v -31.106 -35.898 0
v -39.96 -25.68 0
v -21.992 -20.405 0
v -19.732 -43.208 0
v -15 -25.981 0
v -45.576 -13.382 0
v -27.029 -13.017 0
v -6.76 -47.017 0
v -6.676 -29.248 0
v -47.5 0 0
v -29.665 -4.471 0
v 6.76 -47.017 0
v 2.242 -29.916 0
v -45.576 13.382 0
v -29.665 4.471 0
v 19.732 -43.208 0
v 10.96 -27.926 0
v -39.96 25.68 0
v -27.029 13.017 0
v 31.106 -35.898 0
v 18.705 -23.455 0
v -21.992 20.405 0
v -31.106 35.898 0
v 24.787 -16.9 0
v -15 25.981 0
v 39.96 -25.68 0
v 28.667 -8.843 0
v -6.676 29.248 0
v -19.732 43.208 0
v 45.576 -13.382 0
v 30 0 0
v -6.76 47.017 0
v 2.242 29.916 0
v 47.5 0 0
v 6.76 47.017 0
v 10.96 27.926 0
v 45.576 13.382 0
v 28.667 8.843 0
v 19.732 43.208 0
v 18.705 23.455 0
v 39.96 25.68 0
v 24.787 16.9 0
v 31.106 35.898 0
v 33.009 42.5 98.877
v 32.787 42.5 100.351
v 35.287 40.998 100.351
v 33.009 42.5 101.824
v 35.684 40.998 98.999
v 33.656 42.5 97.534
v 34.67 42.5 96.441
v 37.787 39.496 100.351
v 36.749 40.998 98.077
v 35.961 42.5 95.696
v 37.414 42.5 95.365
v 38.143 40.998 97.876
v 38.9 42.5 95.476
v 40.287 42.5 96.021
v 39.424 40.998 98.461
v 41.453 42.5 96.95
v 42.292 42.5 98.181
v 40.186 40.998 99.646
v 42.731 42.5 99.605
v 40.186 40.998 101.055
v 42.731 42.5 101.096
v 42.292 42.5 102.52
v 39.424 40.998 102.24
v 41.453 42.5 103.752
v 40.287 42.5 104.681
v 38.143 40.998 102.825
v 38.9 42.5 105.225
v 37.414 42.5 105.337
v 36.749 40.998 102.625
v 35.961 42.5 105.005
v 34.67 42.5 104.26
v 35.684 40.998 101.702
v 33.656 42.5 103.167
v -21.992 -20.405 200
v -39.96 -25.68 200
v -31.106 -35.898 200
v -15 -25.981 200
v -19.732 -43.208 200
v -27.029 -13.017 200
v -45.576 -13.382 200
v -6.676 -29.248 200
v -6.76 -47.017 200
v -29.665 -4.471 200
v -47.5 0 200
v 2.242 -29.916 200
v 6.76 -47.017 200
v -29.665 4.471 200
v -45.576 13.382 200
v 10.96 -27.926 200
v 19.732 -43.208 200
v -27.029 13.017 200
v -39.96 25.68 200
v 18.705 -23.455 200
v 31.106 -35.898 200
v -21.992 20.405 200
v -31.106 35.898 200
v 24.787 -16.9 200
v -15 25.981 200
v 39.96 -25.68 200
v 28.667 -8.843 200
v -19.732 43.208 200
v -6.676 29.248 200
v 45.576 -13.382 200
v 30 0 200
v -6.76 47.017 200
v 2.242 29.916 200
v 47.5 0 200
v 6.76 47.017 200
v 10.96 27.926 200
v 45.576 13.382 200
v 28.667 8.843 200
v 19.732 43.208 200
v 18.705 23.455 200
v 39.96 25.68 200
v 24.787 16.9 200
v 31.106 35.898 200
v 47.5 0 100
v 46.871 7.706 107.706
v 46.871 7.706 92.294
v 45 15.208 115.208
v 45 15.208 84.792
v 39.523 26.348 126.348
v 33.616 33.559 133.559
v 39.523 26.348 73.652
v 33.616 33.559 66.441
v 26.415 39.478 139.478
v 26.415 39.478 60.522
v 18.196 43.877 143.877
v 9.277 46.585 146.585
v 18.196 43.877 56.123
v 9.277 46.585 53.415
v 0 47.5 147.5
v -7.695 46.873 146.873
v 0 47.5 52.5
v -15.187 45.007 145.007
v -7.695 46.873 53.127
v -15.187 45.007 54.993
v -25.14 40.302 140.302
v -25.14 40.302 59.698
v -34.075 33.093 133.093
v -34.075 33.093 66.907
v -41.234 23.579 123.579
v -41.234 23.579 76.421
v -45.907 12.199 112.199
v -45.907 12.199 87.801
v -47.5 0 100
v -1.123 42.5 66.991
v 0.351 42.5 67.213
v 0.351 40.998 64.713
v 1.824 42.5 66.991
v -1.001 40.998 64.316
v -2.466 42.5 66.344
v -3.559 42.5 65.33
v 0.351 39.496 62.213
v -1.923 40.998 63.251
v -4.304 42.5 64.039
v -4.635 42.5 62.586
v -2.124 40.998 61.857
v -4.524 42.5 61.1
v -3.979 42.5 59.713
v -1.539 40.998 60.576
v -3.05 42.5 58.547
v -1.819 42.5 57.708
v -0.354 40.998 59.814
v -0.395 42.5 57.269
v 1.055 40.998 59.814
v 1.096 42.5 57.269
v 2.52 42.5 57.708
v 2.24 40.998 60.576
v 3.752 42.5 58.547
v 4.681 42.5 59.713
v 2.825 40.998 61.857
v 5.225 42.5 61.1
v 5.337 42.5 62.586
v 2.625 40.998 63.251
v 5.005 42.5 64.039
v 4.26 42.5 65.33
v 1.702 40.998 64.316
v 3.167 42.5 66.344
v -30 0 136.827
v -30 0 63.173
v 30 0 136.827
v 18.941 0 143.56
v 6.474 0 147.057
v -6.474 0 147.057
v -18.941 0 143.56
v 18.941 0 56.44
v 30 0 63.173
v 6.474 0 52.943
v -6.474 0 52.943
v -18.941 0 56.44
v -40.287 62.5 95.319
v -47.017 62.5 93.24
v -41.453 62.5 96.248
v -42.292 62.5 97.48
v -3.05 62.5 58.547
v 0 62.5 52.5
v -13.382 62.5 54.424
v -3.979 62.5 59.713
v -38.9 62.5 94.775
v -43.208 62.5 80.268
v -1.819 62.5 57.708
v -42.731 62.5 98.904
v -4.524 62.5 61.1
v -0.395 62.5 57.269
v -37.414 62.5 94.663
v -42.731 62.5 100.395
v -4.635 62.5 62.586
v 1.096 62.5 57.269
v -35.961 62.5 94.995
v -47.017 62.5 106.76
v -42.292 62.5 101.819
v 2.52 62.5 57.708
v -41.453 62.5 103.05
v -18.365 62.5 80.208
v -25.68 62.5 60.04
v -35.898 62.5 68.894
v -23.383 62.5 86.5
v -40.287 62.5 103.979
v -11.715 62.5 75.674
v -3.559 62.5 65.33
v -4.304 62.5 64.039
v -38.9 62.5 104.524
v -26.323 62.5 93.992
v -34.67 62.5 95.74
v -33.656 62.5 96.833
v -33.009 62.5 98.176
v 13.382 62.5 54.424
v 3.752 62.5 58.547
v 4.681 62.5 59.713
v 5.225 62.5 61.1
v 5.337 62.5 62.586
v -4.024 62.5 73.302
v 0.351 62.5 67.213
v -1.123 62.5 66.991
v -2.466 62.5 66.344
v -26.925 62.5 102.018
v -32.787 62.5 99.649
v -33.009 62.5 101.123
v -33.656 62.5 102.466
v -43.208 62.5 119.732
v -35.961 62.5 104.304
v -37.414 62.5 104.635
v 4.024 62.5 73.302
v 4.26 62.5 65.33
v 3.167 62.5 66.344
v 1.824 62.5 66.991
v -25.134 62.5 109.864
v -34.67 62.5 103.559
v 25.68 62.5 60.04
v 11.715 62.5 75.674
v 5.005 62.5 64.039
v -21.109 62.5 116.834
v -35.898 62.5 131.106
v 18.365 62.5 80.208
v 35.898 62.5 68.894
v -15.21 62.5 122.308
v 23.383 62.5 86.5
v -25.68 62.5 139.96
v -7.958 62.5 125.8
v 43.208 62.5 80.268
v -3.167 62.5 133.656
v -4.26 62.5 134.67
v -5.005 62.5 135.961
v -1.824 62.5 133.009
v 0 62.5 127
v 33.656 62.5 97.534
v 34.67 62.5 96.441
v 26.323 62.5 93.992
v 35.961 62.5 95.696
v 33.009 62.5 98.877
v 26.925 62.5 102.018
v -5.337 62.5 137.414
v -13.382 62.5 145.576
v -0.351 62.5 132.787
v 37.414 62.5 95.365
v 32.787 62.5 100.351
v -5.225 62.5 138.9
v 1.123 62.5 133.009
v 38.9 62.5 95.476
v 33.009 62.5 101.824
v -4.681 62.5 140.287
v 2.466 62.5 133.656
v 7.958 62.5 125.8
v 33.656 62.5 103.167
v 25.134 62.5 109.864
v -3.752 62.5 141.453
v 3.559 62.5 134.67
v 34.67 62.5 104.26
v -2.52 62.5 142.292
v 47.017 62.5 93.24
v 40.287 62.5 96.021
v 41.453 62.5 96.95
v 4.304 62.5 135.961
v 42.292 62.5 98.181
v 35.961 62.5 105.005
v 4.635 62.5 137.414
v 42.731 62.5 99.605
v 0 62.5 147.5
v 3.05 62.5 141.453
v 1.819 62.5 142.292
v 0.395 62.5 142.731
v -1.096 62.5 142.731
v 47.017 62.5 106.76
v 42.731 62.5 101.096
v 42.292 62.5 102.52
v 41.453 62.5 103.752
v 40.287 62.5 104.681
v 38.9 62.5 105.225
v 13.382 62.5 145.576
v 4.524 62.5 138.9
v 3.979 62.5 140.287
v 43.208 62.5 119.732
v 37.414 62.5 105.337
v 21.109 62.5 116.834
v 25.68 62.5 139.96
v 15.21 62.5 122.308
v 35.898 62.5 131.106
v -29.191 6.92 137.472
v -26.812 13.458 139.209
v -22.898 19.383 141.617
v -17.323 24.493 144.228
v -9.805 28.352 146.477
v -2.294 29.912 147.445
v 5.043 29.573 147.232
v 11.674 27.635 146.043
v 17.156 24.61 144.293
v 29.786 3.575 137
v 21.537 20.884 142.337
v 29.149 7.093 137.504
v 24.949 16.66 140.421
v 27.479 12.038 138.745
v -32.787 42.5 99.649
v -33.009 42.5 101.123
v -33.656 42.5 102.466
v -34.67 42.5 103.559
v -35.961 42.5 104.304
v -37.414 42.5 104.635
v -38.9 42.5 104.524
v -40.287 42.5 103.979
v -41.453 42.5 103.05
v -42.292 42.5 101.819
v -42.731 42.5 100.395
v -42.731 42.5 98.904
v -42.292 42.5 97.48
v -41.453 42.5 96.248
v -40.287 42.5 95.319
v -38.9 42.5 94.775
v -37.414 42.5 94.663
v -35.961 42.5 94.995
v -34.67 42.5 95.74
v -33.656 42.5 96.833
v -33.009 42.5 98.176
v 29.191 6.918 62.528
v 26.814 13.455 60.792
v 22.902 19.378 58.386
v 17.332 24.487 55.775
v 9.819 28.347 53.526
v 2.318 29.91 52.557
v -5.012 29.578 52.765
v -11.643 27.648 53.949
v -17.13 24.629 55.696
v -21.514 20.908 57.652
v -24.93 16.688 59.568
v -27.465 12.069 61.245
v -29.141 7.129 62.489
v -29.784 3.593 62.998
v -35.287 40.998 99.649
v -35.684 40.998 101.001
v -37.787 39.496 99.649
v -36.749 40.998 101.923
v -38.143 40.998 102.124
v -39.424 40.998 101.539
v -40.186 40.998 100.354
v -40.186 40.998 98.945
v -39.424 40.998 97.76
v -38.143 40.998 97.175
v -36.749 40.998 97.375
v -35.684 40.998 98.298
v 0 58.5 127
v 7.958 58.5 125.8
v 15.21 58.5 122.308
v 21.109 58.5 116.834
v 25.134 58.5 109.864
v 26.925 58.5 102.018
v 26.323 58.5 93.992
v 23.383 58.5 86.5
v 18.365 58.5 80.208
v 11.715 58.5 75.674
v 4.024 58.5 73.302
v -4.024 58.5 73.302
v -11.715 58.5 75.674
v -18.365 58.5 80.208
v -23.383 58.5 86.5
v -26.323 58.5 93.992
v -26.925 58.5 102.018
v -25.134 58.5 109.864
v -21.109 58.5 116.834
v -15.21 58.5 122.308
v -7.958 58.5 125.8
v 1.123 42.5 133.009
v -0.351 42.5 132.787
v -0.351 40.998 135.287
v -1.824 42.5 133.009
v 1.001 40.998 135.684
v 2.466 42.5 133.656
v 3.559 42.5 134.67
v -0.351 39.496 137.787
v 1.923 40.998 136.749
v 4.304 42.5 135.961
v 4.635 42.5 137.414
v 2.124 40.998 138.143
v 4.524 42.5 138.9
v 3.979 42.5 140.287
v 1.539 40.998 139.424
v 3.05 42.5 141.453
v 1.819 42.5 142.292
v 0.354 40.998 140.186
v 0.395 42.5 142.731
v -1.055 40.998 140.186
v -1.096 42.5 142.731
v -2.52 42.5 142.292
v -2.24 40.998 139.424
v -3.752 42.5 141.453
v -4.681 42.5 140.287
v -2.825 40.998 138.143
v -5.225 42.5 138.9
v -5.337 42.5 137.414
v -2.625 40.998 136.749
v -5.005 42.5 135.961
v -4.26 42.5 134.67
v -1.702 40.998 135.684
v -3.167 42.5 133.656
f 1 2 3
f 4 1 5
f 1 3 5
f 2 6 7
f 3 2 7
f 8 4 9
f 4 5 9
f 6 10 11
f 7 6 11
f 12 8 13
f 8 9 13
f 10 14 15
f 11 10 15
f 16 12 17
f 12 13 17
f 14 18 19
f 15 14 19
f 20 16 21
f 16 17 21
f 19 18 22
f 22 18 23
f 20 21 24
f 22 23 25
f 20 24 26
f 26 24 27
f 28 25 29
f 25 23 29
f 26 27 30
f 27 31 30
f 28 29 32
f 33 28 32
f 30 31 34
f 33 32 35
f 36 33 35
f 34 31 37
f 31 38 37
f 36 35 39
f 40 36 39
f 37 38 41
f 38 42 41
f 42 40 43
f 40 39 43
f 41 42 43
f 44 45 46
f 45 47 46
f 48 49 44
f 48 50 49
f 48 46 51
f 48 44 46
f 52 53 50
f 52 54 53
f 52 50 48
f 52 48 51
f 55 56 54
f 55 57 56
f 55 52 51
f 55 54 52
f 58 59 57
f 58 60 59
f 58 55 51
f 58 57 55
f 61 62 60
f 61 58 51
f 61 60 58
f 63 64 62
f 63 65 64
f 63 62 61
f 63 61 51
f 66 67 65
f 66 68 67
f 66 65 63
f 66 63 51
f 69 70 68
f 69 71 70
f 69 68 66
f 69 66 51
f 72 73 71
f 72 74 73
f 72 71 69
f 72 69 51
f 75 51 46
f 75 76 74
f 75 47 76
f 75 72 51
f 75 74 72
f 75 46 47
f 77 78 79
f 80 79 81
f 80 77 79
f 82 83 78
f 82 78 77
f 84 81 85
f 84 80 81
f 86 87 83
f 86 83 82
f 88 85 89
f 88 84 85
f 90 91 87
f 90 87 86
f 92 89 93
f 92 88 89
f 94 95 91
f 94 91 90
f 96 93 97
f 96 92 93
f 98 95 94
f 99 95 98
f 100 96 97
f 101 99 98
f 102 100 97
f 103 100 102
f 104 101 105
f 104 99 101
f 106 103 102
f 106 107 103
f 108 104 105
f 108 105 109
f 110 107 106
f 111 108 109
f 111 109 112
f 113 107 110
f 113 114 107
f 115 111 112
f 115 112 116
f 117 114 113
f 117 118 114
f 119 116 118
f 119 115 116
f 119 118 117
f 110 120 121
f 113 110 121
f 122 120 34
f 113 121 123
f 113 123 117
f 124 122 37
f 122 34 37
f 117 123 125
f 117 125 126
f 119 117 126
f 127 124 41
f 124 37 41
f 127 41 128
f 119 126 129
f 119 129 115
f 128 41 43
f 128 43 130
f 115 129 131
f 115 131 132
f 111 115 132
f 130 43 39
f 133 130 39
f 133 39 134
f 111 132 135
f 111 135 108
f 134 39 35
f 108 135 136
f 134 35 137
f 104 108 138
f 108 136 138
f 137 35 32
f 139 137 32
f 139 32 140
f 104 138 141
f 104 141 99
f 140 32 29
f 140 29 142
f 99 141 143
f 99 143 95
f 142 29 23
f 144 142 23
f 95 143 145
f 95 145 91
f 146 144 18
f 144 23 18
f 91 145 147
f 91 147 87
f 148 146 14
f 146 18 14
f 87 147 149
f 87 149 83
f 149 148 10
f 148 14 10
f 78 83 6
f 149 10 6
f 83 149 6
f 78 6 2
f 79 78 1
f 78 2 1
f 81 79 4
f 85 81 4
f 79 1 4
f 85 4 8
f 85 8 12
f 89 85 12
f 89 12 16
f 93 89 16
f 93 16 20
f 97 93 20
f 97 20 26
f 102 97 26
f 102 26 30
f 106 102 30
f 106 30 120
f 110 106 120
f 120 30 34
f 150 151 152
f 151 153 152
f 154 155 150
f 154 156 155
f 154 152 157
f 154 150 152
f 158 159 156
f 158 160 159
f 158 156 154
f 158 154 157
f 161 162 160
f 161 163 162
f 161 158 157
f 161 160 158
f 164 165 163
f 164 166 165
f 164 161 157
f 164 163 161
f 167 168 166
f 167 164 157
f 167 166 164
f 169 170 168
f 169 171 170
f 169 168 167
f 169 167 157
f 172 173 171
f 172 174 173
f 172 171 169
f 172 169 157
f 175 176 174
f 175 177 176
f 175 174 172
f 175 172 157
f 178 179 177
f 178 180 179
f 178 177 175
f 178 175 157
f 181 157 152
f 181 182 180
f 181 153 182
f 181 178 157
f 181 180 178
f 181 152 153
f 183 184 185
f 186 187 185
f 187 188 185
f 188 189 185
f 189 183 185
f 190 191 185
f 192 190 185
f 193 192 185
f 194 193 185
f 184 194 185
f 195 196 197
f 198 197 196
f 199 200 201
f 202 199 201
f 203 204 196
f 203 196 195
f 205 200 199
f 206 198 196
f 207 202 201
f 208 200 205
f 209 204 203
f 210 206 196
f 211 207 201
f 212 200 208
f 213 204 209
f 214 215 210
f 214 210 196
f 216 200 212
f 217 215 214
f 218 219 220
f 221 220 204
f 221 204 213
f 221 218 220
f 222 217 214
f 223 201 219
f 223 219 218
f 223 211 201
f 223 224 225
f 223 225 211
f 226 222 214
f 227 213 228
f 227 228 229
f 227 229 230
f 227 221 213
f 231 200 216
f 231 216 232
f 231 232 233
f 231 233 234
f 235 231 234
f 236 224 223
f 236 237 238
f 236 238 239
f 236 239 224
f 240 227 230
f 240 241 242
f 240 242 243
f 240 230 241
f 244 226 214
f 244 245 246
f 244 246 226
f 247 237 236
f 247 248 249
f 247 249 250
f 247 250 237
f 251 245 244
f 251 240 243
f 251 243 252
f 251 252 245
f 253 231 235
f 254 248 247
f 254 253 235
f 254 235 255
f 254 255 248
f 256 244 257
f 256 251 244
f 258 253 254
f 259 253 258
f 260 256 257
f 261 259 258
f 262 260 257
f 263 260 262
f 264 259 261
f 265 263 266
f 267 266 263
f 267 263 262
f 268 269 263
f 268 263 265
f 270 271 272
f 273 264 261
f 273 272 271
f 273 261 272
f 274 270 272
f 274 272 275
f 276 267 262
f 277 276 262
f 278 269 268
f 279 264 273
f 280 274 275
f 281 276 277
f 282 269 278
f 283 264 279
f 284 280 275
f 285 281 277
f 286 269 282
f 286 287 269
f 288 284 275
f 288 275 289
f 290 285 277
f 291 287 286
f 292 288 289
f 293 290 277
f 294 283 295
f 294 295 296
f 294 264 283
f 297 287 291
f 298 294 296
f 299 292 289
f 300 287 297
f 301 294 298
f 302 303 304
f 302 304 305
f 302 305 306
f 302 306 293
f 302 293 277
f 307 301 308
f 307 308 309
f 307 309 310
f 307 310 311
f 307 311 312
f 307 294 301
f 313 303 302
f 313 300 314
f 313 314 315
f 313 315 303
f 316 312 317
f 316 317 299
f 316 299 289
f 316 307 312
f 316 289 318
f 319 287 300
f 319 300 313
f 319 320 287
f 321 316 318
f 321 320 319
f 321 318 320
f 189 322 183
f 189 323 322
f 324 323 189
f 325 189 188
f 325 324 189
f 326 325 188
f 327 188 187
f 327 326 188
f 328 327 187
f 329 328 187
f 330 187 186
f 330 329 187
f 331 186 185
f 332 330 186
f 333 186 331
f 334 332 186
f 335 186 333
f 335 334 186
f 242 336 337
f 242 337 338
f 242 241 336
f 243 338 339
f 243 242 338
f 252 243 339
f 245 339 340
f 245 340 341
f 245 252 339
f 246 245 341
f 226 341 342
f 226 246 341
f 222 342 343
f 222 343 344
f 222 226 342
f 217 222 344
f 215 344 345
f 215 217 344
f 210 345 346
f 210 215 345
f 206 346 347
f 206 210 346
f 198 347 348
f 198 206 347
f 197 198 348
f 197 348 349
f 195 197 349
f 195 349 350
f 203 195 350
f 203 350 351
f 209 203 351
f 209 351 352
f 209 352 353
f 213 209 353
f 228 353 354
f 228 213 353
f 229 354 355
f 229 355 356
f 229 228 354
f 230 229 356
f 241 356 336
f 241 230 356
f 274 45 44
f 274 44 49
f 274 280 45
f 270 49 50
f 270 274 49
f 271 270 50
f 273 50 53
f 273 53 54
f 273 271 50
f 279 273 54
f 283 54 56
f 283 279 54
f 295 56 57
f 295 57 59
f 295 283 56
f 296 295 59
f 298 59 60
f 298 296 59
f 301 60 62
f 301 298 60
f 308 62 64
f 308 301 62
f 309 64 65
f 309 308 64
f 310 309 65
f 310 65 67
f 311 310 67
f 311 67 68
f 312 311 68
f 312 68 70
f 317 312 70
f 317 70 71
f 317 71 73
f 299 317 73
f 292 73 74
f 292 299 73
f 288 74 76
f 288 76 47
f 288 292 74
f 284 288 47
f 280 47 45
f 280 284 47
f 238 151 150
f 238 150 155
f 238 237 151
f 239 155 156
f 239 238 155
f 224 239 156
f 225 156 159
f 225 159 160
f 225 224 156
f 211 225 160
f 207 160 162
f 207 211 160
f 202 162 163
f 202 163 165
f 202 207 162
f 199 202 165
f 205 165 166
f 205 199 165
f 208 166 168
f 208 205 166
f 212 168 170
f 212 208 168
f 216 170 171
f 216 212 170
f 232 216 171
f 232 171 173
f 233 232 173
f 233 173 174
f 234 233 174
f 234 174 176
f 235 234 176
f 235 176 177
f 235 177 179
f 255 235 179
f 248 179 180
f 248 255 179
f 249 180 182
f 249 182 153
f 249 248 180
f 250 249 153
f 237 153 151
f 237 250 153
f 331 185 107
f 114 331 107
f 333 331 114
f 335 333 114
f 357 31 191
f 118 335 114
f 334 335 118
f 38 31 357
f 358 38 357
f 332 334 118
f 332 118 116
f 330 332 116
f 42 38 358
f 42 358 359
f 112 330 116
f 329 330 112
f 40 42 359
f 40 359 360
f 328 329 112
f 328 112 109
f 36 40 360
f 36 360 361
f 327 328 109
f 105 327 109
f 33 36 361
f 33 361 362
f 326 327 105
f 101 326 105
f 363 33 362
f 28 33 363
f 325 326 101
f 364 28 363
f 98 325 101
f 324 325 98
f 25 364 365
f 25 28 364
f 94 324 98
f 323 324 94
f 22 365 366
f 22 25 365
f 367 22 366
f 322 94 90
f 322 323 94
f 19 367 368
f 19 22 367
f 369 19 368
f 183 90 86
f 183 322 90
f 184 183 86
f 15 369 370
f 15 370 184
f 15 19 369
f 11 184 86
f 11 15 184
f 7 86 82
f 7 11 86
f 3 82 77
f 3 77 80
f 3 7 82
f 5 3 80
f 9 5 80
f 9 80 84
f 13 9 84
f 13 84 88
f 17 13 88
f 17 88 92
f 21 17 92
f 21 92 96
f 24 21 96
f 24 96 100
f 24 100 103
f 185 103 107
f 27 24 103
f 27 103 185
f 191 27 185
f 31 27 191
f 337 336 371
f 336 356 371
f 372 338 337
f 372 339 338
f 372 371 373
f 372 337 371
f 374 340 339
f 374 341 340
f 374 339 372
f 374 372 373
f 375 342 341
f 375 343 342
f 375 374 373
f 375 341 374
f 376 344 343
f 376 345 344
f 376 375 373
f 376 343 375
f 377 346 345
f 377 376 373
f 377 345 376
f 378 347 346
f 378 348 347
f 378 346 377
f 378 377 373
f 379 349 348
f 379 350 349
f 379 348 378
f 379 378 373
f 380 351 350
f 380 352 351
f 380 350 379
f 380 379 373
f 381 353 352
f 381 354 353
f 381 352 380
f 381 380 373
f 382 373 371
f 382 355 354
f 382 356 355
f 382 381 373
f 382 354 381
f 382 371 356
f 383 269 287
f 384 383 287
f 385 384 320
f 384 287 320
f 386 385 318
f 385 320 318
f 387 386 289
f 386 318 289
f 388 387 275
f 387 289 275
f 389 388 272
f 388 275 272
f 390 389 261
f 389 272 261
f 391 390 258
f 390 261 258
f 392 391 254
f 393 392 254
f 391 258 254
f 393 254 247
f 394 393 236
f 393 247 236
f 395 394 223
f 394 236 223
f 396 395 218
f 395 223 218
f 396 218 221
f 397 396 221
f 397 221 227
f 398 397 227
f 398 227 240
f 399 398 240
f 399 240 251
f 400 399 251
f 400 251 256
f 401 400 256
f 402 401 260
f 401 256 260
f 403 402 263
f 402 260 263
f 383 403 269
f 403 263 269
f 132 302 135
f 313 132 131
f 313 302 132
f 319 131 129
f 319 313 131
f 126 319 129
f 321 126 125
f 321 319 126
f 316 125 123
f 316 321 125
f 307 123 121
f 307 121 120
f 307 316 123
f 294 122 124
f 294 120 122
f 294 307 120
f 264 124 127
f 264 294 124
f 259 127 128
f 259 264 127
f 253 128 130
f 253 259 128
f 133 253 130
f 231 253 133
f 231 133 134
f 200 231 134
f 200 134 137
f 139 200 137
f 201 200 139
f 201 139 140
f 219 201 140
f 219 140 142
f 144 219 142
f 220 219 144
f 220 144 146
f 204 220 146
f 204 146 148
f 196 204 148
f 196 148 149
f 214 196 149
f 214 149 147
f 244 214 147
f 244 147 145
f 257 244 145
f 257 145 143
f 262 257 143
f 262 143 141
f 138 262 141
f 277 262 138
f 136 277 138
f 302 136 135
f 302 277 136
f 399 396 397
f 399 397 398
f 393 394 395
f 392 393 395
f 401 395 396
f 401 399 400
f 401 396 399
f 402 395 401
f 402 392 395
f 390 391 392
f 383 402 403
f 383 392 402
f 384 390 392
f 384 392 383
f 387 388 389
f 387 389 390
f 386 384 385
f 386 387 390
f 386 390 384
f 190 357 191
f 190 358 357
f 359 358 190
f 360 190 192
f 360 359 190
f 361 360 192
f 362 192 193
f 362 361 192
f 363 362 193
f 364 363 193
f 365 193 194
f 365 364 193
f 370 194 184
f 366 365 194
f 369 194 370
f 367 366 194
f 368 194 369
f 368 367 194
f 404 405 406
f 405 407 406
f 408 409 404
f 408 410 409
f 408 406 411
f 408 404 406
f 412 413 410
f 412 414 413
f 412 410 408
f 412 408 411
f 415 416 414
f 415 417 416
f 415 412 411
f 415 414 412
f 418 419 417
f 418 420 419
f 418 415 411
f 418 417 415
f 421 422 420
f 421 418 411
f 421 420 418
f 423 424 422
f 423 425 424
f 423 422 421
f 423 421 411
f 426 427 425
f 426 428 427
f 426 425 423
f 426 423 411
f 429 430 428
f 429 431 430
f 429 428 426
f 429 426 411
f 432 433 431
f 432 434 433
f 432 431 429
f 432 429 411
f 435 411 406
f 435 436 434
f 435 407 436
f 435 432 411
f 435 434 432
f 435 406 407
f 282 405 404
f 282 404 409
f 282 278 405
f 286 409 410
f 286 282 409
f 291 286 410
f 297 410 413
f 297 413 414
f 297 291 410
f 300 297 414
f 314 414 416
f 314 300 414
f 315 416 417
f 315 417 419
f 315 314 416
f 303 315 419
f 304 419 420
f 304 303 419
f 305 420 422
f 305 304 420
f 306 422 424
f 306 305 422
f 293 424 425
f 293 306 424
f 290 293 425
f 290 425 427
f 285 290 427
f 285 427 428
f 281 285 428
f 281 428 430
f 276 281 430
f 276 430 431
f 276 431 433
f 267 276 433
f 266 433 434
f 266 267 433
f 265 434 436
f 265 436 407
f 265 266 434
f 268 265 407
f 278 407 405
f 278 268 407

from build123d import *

# Parameters (mm, degrees)
SKETCH1_R           = 47.5
SKETCH1_R_2         = 30
BOSS_EXTRUDE1_DEPTH = 200
SKETCH2_R           = 47.5
BOSS_EXTRUDE2_DEPTH = 62.5
SKETCH3_R           = 27
CUT_EXTRUDE1_DEPTH  = 4
CIRPATTERN1_COUNT   = 4


with BuildPart() as part:
    # Sketch1 → Boss-Extrude1 (new body)
    with BuildSketch(Plane.XY):
        Circle(SKETCH1_R)
        Circle(SKETCH1_R_2, mode=Mode.SUBTRACT)
    extrude(amount=BOSS_EXTRUDE1_DEPTH)

    # Sketch2 → Boss-Extrude2 (add)
    with BuildSketch(Plane(origin=(0, 62.5, 0), x_dir=(1, 0, 0), z_dir=(0, 1, 0))):
        with Locations(Location((0, -100, 0), (0, 0, 270))):
            Circle(SKETCH2_R)
    extrude(amount=-BOSS_EXTRUDE2_DEPTH)

    # Sketch3 → Cut-Extrude1 (cut)
    with BuildSketch(Plane(origin=(0, 62.5, 0), x_dir=(1, 0, 0), z_dir=(0, 1, 0))):
        with Locations(Location((0, -100, 0), (0, 0, 270))):
            Circle(SKETCH3_R)
    extrude(amount=-CUT_EXTRUDE1_DEPTH, mode=Mode.SUBTRACT)

    # Sketch6 → Ø1.0mm Dowel Hole1 (revolve, cut)
    with BuildSketch(Plane(origin=(0.350654227, 62.5, 62.212739692), x_dir=(0, 0, 1), z_dir=(1, 0, 0))):
        Polygon((0, 0), (0, 23.004303095), (5, 20), (5, 0), align=None)
    f_1_0mm_dowel_hole1 = revolve(axis=Axis((0.350654227, 68.85, 62.212739692), (0, -1, 0)), mode=Mode.SUBTRACT)

    # CirPattern1: Ø1.0mm Dowel Hole1 ×4 about axis
    cirpattern1_axis = Axis((0, 0, 100), (0, 1, 0))
    for i in range(1, CIRPATTERN1_COUNT):
        add(f_1_0mm_dowel_hole1.rotate(cirpattern1_axis, i * 360 / CIRPATTERN1_COUNT), mode=Mode.SUBTRACT)


solid = part.part
